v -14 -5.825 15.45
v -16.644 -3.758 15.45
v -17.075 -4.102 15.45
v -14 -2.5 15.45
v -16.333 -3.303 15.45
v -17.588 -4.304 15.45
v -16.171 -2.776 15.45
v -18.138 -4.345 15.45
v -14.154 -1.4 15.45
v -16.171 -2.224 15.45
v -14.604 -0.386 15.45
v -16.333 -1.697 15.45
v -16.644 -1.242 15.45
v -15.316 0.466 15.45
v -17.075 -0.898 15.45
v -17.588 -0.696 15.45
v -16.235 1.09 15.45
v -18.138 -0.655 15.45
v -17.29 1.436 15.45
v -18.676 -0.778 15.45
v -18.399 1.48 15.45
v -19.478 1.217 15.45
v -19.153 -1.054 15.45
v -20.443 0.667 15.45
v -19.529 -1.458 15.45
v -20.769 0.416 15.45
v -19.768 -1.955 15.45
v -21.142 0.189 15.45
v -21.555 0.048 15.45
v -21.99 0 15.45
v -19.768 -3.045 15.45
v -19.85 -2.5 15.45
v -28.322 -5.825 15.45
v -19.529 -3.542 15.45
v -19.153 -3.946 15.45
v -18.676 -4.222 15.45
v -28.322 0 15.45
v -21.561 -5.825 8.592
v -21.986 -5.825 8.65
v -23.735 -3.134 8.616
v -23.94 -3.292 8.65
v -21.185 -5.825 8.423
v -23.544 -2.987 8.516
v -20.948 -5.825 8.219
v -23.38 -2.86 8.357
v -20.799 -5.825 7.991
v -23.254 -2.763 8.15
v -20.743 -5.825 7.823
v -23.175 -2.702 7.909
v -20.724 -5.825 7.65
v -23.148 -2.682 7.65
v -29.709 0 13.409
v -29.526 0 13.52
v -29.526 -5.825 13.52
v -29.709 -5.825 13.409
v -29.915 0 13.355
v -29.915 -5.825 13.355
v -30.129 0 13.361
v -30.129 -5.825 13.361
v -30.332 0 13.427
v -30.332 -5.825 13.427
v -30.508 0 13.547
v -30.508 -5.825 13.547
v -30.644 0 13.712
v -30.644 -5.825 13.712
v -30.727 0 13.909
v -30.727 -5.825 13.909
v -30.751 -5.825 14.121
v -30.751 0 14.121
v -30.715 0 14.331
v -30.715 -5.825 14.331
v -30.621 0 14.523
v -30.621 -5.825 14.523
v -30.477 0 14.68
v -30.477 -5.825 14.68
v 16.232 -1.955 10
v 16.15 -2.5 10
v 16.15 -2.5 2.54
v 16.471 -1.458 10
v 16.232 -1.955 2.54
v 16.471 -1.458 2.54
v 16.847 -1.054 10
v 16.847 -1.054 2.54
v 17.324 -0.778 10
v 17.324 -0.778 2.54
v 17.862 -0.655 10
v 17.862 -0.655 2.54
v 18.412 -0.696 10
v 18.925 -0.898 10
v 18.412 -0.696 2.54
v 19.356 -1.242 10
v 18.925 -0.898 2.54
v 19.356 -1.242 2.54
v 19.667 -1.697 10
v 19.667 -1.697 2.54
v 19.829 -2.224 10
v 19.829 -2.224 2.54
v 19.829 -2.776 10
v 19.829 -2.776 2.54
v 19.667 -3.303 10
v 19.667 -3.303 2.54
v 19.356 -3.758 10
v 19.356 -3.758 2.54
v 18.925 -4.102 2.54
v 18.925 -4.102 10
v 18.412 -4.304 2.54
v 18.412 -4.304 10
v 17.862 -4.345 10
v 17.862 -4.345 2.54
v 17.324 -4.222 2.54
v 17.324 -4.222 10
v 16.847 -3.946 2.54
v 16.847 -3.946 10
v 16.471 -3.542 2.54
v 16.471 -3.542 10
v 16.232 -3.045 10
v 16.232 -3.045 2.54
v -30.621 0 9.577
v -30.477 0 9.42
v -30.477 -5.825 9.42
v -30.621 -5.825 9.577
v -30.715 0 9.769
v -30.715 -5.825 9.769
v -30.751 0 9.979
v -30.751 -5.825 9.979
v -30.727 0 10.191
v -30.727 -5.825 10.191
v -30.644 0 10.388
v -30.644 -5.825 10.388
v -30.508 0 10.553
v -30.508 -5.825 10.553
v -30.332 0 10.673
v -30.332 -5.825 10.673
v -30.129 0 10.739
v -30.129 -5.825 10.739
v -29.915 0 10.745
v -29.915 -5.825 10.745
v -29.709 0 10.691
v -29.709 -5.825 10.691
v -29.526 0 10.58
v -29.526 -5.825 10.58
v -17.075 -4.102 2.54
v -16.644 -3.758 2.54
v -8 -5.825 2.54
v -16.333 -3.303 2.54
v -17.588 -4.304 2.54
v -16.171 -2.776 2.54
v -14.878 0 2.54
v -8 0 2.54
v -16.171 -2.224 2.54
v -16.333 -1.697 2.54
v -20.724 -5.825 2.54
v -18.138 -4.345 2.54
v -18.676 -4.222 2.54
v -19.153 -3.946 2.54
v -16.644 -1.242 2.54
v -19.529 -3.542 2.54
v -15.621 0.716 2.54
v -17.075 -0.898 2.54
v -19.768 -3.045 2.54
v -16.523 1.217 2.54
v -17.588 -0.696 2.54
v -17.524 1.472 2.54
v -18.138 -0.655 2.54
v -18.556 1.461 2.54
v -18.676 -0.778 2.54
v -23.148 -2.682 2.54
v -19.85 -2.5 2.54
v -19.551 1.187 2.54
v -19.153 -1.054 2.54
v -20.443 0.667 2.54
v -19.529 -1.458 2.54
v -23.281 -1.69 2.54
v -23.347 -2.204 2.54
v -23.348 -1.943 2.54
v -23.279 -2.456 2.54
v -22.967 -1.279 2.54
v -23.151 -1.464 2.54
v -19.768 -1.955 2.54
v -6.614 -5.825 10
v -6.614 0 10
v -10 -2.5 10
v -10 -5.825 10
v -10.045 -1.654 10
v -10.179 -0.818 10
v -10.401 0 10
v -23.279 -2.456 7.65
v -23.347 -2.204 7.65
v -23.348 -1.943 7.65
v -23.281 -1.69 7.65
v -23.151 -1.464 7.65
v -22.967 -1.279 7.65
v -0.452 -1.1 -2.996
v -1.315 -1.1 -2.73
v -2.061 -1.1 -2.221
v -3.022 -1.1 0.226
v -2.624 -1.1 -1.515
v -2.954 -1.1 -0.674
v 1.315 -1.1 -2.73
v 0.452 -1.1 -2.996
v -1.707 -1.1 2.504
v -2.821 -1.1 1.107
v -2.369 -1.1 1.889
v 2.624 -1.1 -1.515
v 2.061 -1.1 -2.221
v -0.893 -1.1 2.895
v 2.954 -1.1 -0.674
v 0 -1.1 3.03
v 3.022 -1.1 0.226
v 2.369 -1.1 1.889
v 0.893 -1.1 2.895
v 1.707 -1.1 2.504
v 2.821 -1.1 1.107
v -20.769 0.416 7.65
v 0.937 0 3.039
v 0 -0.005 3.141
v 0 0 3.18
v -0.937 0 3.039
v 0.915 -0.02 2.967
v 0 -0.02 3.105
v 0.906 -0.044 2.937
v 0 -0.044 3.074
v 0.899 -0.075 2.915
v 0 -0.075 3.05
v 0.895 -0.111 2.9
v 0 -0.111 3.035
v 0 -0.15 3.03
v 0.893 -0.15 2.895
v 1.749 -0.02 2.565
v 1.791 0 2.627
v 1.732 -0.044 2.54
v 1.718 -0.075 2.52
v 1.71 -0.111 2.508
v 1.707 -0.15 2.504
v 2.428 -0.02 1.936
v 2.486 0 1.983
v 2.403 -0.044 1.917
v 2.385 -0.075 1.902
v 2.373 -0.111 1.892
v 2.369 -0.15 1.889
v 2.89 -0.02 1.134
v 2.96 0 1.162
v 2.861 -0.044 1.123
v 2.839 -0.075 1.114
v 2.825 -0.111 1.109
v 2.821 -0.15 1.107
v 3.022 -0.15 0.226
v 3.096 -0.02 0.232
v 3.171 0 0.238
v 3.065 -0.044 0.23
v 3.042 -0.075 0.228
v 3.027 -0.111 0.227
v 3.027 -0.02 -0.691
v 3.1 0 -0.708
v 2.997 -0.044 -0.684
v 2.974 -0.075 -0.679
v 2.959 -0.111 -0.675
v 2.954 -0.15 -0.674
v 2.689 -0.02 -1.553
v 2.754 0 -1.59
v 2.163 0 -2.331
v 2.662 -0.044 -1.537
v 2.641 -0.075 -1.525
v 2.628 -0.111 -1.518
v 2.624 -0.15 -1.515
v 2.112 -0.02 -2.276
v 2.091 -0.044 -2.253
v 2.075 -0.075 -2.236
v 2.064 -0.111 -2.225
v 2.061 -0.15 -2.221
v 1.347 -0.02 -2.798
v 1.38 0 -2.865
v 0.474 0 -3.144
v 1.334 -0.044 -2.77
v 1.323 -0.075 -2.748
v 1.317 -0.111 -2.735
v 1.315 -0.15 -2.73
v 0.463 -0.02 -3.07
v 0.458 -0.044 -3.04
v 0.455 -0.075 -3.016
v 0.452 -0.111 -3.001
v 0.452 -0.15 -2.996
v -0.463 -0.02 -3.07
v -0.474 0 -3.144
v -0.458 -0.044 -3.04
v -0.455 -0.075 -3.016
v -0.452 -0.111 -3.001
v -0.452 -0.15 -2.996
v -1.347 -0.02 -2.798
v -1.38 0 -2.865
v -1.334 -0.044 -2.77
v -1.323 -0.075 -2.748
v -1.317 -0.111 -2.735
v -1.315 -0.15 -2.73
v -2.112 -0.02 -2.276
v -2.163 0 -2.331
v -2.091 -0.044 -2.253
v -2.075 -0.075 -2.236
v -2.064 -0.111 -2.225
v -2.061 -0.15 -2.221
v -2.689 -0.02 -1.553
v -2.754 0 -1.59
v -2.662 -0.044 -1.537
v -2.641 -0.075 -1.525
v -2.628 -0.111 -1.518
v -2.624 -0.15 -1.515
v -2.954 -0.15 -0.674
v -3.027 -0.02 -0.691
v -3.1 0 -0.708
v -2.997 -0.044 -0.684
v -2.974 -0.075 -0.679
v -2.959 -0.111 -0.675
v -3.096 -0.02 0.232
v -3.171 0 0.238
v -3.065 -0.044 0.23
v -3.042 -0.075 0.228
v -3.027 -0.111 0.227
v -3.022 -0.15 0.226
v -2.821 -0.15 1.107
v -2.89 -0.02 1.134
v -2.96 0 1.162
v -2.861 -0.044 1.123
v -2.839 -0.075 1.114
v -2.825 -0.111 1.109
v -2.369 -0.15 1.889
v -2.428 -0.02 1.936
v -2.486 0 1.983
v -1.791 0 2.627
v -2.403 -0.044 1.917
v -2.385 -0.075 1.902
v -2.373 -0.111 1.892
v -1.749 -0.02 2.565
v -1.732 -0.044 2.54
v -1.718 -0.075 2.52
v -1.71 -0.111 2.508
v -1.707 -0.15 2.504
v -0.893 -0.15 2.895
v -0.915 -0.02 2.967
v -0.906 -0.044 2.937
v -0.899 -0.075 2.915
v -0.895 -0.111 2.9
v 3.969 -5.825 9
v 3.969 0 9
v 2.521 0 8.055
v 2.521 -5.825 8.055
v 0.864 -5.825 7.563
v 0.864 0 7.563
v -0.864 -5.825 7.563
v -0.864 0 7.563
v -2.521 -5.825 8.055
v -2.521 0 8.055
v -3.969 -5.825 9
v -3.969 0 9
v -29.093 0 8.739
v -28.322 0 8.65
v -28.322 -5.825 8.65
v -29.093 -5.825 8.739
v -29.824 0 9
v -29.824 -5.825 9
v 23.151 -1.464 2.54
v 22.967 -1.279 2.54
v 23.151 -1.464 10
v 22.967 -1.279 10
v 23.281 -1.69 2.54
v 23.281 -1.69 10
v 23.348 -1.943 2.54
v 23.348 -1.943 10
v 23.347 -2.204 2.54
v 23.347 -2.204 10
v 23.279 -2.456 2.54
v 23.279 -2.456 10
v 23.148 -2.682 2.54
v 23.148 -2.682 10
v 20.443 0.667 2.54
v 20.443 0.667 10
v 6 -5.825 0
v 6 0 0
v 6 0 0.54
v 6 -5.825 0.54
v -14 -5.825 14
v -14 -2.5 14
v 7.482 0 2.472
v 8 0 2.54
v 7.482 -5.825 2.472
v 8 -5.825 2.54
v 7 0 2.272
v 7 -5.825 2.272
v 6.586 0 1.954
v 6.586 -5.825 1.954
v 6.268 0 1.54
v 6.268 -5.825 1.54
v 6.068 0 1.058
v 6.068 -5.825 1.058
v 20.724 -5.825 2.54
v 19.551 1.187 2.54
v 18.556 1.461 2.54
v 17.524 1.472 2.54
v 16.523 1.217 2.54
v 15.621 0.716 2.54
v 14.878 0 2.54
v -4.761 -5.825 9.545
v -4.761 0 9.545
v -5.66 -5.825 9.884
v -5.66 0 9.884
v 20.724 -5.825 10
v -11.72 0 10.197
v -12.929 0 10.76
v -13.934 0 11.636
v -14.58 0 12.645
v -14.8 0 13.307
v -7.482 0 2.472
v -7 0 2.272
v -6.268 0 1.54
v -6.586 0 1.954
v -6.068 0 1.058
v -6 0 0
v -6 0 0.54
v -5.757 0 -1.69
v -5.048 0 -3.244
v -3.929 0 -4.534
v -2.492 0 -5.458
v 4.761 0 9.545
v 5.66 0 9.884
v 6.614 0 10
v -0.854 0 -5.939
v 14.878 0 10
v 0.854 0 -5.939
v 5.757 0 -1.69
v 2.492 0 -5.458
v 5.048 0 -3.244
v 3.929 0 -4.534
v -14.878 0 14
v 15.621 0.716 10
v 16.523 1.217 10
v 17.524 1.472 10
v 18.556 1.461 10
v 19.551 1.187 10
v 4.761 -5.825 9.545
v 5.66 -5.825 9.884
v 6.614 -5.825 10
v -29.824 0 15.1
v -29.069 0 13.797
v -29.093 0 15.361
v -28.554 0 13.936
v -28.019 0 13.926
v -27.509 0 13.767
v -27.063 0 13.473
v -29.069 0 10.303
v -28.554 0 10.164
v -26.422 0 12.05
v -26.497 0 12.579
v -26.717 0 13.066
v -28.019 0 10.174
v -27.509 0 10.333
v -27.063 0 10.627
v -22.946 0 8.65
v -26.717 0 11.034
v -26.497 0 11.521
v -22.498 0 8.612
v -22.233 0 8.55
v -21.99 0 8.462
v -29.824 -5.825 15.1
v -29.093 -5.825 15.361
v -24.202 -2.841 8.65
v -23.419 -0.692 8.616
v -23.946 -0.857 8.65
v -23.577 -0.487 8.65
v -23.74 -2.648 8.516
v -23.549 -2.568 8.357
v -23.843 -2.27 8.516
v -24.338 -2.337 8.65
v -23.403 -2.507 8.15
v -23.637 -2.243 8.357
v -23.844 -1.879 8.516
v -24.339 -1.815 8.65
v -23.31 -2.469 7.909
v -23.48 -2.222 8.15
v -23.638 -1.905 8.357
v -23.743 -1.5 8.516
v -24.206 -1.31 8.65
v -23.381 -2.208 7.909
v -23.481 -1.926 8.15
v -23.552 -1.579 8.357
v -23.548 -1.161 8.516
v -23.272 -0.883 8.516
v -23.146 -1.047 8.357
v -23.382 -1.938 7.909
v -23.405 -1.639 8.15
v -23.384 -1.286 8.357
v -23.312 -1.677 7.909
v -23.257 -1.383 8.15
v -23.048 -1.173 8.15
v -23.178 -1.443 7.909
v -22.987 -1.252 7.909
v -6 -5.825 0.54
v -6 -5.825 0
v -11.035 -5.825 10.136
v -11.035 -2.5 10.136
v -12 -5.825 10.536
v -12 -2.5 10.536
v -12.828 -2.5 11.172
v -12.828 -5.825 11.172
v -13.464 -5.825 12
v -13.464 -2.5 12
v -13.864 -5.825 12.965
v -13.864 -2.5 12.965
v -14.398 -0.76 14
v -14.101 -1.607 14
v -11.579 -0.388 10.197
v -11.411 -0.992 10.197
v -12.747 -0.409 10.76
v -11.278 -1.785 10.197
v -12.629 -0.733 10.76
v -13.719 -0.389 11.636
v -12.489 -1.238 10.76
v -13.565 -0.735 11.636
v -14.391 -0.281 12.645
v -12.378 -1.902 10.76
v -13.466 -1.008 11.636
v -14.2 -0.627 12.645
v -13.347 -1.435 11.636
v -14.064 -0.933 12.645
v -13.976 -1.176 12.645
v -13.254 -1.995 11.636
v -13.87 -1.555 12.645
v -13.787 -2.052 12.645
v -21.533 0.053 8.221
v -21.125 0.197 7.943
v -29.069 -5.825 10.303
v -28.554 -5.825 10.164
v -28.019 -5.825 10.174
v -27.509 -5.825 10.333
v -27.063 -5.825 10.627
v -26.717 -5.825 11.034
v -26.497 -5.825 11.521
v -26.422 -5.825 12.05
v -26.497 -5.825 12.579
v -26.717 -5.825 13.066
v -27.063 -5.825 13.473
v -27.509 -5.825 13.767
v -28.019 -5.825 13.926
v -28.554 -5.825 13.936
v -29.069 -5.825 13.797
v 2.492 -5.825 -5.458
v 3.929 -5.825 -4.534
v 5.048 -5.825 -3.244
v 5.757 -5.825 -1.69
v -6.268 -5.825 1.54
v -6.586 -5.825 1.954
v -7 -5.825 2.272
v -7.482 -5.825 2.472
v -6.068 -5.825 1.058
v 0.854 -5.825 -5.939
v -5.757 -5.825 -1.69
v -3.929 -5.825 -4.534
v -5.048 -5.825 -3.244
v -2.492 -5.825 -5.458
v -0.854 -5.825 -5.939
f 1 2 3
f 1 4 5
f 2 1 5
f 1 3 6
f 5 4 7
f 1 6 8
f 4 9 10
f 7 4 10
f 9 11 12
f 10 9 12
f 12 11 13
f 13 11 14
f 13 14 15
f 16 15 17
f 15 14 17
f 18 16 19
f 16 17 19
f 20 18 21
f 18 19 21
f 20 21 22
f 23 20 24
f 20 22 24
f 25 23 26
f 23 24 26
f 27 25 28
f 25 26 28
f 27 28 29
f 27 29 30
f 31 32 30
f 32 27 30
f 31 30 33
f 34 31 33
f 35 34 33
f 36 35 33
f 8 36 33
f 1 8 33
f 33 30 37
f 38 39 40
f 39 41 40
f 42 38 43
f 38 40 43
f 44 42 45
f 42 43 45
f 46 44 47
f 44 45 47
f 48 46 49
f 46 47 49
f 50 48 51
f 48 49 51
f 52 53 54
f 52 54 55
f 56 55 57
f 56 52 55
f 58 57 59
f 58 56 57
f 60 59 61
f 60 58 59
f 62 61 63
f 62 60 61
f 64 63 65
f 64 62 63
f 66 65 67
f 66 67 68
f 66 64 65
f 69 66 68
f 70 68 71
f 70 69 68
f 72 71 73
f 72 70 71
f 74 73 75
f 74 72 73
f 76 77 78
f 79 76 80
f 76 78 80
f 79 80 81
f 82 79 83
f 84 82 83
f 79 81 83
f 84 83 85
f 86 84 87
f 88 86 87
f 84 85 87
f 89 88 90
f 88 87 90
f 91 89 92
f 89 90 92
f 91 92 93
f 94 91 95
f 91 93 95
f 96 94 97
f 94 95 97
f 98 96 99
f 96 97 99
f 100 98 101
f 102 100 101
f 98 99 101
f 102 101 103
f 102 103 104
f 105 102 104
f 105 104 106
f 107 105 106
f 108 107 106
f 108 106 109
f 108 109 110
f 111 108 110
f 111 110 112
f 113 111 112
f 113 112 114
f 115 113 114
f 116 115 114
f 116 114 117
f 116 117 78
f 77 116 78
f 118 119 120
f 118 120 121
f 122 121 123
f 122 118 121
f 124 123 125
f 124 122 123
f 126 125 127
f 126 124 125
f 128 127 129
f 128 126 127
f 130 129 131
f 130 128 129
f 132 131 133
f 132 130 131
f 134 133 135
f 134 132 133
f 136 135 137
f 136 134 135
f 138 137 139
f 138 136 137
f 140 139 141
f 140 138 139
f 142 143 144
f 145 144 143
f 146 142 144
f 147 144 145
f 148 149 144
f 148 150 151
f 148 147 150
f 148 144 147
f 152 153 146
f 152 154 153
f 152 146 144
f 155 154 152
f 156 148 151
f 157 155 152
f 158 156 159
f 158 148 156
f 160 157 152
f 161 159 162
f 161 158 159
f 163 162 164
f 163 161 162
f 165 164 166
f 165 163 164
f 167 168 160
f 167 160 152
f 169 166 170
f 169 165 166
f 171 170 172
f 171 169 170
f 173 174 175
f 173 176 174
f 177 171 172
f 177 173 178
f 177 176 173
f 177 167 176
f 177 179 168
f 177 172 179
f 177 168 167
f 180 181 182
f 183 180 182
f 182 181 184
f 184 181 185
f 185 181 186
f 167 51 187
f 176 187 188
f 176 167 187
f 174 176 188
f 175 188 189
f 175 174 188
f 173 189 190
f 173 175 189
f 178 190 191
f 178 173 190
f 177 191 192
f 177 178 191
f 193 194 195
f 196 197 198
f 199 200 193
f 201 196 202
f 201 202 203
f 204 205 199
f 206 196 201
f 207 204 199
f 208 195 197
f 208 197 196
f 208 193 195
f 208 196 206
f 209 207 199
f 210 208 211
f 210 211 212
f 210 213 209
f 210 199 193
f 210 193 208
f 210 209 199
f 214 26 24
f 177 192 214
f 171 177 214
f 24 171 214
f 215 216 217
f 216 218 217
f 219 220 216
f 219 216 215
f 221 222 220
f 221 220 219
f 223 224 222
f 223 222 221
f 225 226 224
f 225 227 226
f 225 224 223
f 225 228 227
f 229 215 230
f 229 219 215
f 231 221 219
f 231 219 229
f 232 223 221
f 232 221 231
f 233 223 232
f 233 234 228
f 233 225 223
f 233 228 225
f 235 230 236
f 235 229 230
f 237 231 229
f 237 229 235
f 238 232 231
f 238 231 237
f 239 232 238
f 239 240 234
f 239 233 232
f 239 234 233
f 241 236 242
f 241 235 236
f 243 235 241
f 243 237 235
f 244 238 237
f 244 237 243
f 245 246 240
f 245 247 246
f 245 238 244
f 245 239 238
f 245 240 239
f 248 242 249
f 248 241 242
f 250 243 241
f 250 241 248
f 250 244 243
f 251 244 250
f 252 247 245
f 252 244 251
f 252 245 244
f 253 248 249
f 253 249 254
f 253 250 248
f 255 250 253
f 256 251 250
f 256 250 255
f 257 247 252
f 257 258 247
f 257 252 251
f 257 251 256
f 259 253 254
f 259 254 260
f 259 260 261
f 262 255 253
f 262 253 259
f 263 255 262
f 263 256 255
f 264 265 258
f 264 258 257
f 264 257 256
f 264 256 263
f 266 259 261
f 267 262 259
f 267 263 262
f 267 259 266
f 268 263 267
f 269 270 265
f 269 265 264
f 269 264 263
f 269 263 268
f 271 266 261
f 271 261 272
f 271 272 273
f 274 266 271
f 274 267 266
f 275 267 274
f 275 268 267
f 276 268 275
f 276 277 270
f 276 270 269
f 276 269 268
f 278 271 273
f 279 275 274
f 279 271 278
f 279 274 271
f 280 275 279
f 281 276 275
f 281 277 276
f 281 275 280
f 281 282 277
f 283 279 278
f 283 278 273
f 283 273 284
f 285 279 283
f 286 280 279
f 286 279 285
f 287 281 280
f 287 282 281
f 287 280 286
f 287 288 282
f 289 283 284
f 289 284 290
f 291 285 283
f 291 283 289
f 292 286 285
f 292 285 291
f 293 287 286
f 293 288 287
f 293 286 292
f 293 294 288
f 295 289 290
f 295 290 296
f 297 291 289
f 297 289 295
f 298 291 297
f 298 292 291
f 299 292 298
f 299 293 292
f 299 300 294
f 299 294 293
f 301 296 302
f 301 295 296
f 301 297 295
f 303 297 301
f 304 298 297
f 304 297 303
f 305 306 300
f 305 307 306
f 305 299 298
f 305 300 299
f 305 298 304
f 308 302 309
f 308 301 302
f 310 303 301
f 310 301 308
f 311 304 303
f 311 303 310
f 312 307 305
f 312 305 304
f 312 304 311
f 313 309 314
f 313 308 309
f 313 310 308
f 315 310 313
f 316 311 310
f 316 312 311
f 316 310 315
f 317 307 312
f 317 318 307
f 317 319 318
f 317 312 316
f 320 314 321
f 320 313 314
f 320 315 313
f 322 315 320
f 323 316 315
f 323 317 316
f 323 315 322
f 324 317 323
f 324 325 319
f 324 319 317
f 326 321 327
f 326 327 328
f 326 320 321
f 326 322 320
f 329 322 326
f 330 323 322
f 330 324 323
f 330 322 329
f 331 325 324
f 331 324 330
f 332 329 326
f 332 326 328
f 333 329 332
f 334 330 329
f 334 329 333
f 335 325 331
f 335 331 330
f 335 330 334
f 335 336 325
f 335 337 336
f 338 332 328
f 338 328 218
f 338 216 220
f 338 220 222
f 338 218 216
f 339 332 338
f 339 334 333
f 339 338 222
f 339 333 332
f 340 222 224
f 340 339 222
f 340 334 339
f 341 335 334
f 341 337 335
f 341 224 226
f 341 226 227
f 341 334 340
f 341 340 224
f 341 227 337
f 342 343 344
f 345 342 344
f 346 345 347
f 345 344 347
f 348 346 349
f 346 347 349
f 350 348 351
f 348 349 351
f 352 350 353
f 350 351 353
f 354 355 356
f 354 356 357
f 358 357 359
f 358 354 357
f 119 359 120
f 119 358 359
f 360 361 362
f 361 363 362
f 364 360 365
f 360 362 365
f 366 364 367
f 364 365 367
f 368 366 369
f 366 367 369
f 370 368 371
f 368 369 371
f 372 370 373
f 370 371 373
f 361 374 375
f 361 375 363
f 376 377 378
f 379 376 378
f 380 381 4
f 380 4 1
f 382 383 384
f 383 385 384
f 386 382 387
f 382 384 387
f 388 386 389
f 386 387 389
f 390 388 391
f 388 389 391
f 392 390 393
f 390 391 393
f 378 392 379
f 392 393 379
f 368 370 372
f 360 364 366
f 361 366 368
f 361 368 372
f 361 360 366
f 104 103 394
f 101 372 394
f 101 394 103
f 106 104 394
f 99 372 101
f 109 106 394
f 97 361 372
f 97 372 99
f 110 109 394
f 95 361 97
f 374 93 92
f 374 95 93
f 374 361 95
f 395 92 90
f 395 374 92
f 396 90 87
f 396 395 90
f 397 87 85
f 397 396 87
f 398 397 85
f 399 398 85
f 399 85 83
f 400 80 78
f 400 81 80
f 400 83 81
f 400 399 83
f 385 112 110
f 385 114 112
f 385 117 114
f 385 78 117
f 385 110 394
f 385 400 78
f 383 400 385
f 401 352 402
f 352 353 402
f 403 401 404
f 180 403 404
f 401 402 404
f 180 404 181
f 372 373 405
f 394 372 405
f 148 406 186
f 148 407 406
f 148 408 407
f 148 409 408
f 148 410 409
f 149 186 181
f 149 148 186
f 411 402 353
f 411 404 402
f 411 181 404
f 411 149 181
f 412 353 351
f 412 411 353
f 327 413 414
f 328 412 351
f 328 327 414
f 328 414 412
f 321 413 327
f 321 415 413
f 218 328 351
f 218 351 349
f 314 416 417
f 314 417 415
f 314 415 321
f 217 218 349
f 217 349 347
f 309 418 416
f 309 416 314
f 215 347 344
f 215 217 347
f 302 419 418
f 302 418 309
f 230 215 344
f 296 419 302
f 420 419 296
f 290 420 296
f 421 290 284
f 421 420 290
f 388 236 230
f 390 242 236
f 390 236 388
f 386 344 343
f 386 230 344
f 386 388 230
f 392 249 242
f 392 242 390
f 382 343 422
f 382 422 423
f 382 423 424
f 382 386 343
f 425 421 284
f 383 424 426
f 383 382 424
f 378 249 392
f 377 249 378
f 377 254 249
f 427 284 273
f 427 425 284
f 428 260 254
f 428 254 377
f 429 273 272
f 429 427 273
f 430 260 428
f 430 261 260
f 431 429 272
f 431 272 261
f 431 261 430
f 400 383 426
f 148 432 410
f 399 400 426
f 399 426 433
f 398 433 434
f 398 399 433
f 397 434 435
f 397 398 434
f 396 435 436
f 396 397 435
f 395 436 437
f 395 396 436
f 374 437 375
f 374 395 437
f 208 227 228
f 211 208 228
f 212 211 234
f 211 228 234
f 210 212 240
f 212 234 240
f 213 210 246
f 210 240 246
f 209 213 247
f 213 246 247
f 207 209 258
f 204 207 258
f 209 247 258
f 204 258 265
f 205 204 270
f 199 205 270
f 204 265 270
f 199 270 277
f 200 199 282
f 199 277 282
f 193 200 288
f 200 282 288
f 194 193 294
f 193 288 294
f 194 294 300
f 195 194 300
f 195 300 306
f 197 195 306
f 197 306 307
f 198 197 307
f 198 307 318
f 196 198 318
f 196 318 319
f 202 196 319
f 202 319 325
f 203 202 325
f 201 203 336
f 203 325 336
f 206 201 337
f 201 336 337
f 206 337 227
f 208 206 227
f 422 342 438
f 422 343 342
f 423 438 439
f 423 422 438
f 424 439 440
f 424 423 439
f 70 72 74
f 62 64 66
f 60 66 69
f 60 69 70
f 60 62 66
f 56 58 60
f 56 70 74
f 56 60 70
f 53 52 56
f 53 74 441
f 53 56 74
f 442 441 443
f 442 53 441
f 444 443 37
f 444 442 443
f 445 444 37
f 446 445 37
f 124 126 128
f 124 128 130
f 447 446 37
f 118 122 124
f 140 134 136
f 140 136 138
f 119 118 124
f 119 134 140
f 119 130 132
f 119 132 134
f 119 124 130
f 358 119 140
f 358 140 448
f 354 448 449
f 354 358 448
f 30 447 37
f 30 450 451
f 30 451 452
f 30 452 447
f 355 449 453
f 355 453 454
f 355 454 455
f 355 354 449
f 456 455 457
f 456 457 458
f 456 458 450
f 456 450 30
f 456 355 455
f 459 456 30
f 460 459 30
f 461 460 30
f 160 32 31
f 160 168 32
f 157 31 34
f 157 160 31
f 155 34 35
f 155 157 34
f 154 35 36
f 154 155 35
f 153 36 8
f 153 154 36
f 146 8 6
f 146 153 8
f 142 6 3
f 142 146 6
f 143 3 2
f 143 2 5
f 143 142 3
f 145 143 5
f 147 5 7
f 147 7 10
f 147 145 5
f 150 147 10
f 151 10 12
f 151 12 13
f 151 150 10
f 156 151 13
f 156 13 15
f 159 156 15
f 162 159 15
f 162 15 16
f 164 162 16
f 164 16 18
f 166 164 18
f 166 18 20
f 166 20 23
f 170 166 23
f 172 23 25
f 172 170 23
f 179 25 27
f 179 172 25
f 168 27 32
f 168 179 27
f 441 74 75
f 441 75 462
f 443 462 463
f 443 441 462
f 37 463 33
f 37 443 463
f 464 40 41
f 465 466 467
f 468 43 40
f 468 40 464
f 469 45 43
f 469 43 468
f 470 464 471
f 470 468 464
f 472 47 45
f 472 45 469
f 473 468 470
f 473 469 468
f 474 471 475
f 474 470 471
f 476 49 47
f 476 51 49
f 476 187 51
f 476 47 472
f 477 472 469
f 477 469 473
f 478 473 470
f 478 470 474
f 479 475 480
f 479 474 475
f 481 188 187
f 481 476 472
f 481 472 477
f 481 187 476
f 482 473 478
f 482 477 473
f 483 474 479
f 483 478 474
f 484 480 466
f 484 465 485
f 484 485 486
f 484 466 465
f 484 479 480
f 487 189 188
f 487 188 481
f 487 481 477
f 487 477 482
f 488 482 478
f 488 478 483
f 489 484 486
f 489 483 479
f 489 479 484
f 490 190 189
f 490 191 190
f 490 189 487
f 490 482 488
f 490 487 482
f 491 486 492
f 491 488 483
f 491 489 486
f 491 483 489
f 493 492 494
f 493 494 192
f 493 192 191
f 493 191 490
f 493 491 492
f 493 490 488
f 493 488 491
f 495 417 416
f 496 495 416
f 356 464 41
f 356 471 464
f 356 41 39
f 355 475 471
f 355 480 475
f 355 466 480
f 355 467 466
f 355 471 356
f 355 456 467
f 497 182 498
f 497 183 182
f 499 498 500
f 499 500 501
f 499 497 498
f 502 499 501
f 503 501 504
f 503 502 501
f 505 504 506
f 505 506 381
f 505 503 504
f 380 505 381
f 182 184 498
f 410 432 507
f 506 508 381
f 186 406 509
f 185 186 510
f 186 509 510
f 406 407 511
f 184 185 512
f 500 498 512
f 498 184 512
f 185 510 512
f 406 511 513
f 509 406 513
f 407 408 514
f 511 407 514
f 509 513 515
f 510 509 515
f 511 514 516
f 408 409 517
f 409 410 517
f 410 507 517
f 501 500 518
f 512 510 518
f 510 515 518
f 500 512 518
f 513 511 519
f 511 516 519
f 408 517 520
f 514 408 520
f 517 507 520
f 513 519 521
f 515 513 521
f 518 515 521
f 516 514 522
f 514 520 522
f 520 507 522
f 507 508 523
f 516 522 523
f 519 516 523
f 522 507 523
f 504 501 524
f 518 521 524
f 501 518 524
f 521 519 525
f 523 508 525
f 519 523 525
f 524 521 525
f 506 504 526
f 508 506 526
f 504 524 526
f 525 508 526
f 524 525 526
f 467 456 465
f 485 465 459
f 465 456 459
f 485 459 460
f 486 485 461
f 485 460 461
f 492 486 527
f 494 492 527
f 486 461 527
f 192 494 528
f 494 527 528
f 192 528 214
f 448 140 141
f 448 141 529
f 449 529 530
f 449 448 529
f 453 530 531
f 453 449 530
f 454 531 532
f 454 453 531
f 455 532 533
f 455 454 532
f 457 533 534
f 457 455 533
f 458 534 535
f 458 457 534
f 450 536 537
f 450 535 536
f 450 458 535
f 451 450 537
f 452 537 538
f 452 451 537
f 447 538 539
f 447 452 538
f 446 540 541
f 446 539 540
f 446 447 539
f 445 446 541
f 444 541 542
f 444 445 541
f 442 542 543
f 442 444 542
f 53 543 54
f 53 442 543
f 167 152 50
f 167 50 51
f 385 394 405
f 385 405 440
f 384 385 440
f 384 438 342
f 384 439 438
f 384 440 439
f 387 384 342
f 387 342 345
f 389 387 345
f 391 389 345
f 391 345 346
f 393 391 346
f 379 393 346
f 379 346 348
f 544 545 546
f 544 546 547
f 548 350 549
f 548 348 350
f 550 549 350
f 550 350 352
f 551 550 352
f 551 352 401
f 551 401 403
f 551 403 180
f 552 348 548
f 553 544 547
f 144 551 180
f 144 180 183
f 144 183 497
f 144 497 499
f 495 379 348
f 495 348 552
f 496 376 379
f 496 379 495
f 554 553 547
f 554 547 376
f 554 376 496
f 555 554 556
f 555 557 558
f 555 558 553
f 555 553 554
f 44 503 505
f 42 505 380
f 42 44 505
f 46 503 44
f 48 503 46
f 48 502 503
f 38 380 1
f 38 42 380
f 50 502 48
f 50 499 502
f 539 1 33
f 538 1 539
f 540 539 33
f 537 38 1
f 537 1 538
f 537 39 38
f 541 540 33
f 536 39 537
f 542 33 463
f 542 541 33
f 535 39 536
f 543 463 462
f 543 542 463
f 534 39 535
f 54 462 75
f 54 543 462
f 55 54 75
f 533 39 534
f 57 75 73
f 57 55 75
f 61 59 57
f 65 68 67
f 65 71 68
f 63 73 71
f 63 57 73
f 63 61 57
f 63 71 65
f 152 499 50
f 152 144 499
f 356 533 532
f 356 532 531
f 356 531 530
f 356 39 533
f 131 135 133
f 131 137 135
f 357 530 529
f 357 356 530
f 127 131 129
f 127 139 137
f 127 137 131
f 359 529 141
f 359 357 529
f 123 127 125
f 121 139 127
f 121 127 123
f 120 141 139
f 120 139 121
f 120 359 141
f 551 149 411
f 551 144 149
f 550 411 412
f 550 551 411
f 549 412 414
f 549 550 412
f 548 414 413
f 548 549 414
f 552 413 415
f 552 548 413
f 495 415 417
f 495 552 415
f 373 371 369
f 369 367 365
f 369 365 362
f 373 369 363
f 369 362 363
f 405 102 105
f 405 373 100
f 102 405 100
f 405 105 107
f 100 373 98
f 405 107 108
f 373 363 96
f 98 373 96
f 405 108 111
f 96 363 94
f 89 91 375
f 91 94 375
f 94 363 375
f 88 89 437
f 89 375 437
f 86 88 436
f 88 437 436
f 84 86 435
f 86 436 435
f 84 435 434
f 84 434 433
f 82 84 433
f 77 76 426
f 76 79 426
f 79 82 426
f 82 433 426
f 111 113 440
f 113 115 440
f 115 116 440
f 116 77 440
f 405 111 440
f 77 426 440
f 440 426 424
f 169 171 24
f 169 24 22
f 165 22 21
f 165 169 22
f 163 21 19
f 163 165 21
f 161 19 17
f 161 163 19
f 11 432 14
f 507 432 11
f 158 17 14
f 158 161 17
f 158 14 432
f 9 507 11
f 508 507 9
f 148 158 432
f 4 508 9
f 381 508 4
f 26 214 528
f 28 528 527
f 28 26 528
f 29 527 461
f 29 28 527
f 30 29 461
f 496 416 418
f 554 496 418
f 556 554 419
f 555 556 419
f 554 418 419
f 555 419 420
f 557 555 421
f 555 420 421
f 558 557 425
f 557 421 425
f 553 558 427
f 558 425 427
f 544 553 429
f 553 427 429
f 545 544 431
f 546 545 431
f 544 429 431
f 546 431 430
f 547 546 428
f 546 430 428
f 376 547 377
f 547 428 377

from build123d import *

# Parameters (mm, degrees)
SKETCH3_W           = 41.4470817463862
SKETCH3_H           = 7.459999999999999
BOSS_EXTRUDE1_DEPTH = 5.825
BOSS_EXTRUDE3_DEPTH = 7.46
BOSS_EXTRUDE4_DEPTH = 5.825
SKETCH7_R           = 3.0300000000000007
CUT_EXTRUDE1_DEPTH  = 1.1
FILLET1_R           = 0.15
SKETCH8_R           = 1.8500000000000012
CUT_EXTRUDE2_DEPTH  = 26.910016764772163
FILLET2_R           = 1
FILLET3_R           = 2
SKETCH10_R          = 1.8500000000000012
BOSS_EXTRUDE5_DEPTH = 5.45
BOSS_EXTRUDE6_REACH = 30.603
SKETCH11_R          = 6
CUT_EXTRUDE3_DEPTH  = 35.90405396884001
FILLET4_R           = 1
FILLET5_R           = 2
FILLET6_R           = 4


with BuildPart() as part:
    # Sketch3 → Boss-Extrude1 (new body)
    with BuildSketch(Plane(origin=(0, 0, 0), x_dir=(1, 0, 0), z_dir=(0, 1, 0))):
        with Locations((7.11e-15, -6.269999999999988)):
            Rectangle(SKETCH3_W, SKETCH3_H)
    extrude(amount=-BOSS_EXTRUDE1_DEPTH)

    # Sketch4 → Boss-Extrude3 (add)
    with BuildSketch(Plane.XY.offset(2.5400000000000014)):
        with BuildLine():
            Line((20.72354087319311, 1e-17), (14.877501000800818, -2.18e-15))
            ThreePointArc((14.877501000800818, -2.18e-15), (17.523673872635282, 1.4715379162724416), (20.442771335934772, 0.6674703156202451))
            Line((20.442771335934772, 0.6674703156202451), (23.75850887052414, -1.8896455528490175))
            Line((23.75850887052414, -1.8896455528490175), (20.72354087319311, -5.825000000000009))
            Line((20.72354087319311, -5.825000000000009), (20.72354087319311, 1e-17))
        make_face()
        with BuildLine():
            Line((-20.723540873193116, -1.342e-14), (-20.72354087319311, -5.825000000000023))
            Line((-20.72354087319311, -5.825000000000023), (-23.75850887052414, -1.8896455528490332))
            Line((-23.75850887052414, -1.8896455528490332), (-20.442771335934772, 0.6674703156202321))
            ThreePointArc((-20.442771335934772, 0.6674703156202321), (-17.523673872635282, 1.4715379162724296), (-14.877501000800818, -1.085e-14))
            Line((-14.877501000800818, -1.085e-14), (-20.723540873193116, -1.342e-14))
        make_face()
    extrude(amount=BOSS_EXTRUDE3_DEPTH)

    # Sketch6 → Boss-Extrude4 (add)
    with BuildSketch(Plane(origin=(0, 0, 0), x_dir=(1, 0, 0), z_dir=(0, 1, 0))):
        with BuildLine():
            Line((6.000000000000012, 0), (6.000000000000012, -2.539999999999988))
            Line((6.000000000000012, -2.539999999999988), (-6.000000000000012, -2.5399999999999876))
            Line((-6.000000000000012, -2.5399999999999876), (-6.000000000000012, 0))
            ThreePointArc((-6.000000000000012, 0), (3.7e-16, 6.000000000000012), (6.000000000000012, 0))
        make_face()
    extrude(amount=-BOSS_EXTRUDE4_DEPTH)

    # Sketch7 → Cut-Extrude1 (cut)
    with BuildSketch(Plane(origin=(0, 0, 0), x_dir=(1, 0, 0), z_dir=(0, 1, 0))):
        with Locations(Location((-3.23e-15, 1.128e-14, 0), (0, 0, 270))):
            Circle(SKETCH7_R)
    extrude(amount=-CUT_EXTRUDE1_DEPTH, mode=Mode.SUBTRACT)

    # Fillet1
    fillet1_edges = [part.edges().sort_by_distance(p)[0] for p in [
        (-3.65e-15, 0, -3.030000000000012),
    ]]
    fillet(fillet1_edges, radius=FILLET1_R)

    # Sketch8 → Cut-Extrude2 (cut, through all)
    with BuildSketch(Plane(origin=(0, 0, 2.5399999999999885), x_dir=(-1, 0, 0), z_dir=(0, 0, -1))):
        with Locations((-18.000000000000007, -2.500000000000002)):
            Circle(SKETCH8_R)
        with Locations((18, -2.500000000000002)):
            Circle(SKETCH8_R)
    extrude(amount=-CUT_EXTRUDE2_DEPTH, mode=Mode.SUBTRACT)

    # Fillet2
    fillet2_edges = [part.edges().sort_by_distance(p)[0] for p in [
        (23.75850887052414, -1.8896455528490175, 6.270000000000001),
        (-23.75850887052414, -1.8896455528490332, 6.270000000000001),
    ]]
    fillet(fillet2_edges, radius=FILLET2_R)

    # Fillet3
    fillet3_edges = [part.edges().sort_by_distance(p)[0] for p in [
        (6.000000000000012, -2.9125, 2.539999999999988),
        (-6.000000000000012, -2.9125, 2.5399999999999876),
    ]]
    fillet(fillet3_edges, radius=FILLET3_R)

    # Sketch10 → Boss-Extrude5 (add)
    with BuildSketch(Plane.XY.offset(9.999999999999988)):
        with BuildLine():
            Line((-14.000000000000012, -2.500000000000014), (-14.000000000000012, -5.825000000000023))
            Line((-14.000000000000012, -5.825000000000023), (-20.72354087319311, -5.825000000000023))
            Line((-20.72354087319311, -5.825000000000023), (-23.147816036529186, -2.681513131755552))
            ThreePointArc((-23.147816036529186, -2.681513131755552), (-23.347708436606982, -1.9427104070558383), (-22.966641291612717, -1.2789527188604377))
            Line((-22.966641291612717, -1.2789527188604377), (-20.442771335934772, 0.6674703156202321))
            ThreePointArc((-20.442771335934772, 0.6674703156202321), (-16.235217484183835, 1.0896438084954059), (-14.000000000000012, -2.500000000000014))
        make_face()
        with Locations(Location((-18, -2.500000000000002, 0), (0, 0, 180))):
            Circle(SKETCH10_R, mode=Mode.SUBTRACT)
    extrude(amount=BOSS_EXTRUDE5_DEPTH)

    # Boss-Extrude6: up to this face of the body (flat: up to its plane)
    boss_extrude6_end = Plane(part.part.faces().sort_by_distance((-1.463911486, -5.825, 5.299880687))[0])
    # Sketch9 → Boss-Extrude6 (add, up to the picked face)
    with BuildSketch(Plane(origin=(0, 0, 0), x_dir=(1, 0, 0), z_dir=(0, 1, 0)), mode=Mode.PRIVATE) as boss_extrude6_sk1:
        with BuildLine():
            Line((-20.723540873193105, -8.650000000000004), (-28.322297461263148, -8.650000000000004))
            ThreePointArc((-28.322297461263148, -8.650000000000004), (-29.466272655610958, -8.848231620695078), (-30.476852522423187, -9.41981132075475))
            ThreePointArc((-30.476852522423187, -9.41981132075475), (-30.58177170288316, -10.475269498785284), (-29.5263135248526, -10.580188679245284))
            ThreePointArc((-29.5263135248526, -10.580188679245284), (-26.4222974612631, -12.050000000000004), (-29.5263135248526, -13.519811320754725))
            ThreePointArc((-29.5263135248526, -13.519811320754725), (-30.581771702883188, -13.624730501214703), (-30.476852522423194, -14.680188679245271))
            ThreePointArc((-30.476852522423194, -14.680188679245271), (-29.466272655610975, -15.251768379304975), (-28.322297461263148, -15.450000000000019))
            Line((-28.322297461263148, -15.450000000000019), (-20.723540873193105, -15.450000000000003))
            Line((-20.723540873193105, -15.450000000000003), (-20.723540873193105, -8.650000000000004))
        make_face()
    boss_extrude6_tool1 = split(extrude(boss_extrude6_sk1.sketch, amount=-BOSS_EXTRUDE6_REACH, mode=Mode.PRIVATE), bisect_by=boss_extrude6_end, keep=Keep.BOTH, mode=Mode.PRIVATE)
    add(boss_extrude6_tool1.solids().sort_by(Axis((-24.875622, 0, 12.05), (0, -1, 0)))[0])

    # Sketch11 → Cut-Extrude3 (cut, through all)
    with BuildSketch(Plane(origin=(0, 0, 0), x_dir=(1, 0, 0), z_dir=(0, 1, 0))):
        with Locations((1.06e-15, -13.500000000000007)):
            Circle(SKETCH11_R)
    extrude(amount=-CUT_EXTRUDE3_DEPTH, mode=Mode.SUBTRACT)

    # Fillet4
    fillet4_edges = [part.edges().sort_by_distance(p)[0] for p in [
        (-23.34770843660698, -1.9427104070558383, 8.650000000000004),
        (-22.137450955112786, -0.6394763594302192, 8.650000000000004),
        (-21.935678454861147, -4.253256565877788, 8.650000000000006),
    ]]
    fillet(fillet4_edges, radius=FILLET4_R)

    # Fillet5
    fillet5_edges = [part.edges().sort_by_distance(p)[0] for p in [
        (-21.30826061861286, -1.1e-16, 11.55),
    ]]
    fillet(fillet5_edges, radius=FILLET5_R)

    # Fillet6
    fillet6_edges = [part.edges().sort_by_distance(p)[0] for p in [
        (-14.225745371812032, -1.1752351145952094, 9.999999999999988),
        (-14.000000000000012, -4.162500000000019, 9.999999999999988),
        (4.873397172404469, -2.9125, 9.999999999999988),
        (-4.873397172404467, -2.9125, 9.999999999999988),
    ]]
    fillet(fillet6_edges, radius=FILLET6_R)


solid = part.part
